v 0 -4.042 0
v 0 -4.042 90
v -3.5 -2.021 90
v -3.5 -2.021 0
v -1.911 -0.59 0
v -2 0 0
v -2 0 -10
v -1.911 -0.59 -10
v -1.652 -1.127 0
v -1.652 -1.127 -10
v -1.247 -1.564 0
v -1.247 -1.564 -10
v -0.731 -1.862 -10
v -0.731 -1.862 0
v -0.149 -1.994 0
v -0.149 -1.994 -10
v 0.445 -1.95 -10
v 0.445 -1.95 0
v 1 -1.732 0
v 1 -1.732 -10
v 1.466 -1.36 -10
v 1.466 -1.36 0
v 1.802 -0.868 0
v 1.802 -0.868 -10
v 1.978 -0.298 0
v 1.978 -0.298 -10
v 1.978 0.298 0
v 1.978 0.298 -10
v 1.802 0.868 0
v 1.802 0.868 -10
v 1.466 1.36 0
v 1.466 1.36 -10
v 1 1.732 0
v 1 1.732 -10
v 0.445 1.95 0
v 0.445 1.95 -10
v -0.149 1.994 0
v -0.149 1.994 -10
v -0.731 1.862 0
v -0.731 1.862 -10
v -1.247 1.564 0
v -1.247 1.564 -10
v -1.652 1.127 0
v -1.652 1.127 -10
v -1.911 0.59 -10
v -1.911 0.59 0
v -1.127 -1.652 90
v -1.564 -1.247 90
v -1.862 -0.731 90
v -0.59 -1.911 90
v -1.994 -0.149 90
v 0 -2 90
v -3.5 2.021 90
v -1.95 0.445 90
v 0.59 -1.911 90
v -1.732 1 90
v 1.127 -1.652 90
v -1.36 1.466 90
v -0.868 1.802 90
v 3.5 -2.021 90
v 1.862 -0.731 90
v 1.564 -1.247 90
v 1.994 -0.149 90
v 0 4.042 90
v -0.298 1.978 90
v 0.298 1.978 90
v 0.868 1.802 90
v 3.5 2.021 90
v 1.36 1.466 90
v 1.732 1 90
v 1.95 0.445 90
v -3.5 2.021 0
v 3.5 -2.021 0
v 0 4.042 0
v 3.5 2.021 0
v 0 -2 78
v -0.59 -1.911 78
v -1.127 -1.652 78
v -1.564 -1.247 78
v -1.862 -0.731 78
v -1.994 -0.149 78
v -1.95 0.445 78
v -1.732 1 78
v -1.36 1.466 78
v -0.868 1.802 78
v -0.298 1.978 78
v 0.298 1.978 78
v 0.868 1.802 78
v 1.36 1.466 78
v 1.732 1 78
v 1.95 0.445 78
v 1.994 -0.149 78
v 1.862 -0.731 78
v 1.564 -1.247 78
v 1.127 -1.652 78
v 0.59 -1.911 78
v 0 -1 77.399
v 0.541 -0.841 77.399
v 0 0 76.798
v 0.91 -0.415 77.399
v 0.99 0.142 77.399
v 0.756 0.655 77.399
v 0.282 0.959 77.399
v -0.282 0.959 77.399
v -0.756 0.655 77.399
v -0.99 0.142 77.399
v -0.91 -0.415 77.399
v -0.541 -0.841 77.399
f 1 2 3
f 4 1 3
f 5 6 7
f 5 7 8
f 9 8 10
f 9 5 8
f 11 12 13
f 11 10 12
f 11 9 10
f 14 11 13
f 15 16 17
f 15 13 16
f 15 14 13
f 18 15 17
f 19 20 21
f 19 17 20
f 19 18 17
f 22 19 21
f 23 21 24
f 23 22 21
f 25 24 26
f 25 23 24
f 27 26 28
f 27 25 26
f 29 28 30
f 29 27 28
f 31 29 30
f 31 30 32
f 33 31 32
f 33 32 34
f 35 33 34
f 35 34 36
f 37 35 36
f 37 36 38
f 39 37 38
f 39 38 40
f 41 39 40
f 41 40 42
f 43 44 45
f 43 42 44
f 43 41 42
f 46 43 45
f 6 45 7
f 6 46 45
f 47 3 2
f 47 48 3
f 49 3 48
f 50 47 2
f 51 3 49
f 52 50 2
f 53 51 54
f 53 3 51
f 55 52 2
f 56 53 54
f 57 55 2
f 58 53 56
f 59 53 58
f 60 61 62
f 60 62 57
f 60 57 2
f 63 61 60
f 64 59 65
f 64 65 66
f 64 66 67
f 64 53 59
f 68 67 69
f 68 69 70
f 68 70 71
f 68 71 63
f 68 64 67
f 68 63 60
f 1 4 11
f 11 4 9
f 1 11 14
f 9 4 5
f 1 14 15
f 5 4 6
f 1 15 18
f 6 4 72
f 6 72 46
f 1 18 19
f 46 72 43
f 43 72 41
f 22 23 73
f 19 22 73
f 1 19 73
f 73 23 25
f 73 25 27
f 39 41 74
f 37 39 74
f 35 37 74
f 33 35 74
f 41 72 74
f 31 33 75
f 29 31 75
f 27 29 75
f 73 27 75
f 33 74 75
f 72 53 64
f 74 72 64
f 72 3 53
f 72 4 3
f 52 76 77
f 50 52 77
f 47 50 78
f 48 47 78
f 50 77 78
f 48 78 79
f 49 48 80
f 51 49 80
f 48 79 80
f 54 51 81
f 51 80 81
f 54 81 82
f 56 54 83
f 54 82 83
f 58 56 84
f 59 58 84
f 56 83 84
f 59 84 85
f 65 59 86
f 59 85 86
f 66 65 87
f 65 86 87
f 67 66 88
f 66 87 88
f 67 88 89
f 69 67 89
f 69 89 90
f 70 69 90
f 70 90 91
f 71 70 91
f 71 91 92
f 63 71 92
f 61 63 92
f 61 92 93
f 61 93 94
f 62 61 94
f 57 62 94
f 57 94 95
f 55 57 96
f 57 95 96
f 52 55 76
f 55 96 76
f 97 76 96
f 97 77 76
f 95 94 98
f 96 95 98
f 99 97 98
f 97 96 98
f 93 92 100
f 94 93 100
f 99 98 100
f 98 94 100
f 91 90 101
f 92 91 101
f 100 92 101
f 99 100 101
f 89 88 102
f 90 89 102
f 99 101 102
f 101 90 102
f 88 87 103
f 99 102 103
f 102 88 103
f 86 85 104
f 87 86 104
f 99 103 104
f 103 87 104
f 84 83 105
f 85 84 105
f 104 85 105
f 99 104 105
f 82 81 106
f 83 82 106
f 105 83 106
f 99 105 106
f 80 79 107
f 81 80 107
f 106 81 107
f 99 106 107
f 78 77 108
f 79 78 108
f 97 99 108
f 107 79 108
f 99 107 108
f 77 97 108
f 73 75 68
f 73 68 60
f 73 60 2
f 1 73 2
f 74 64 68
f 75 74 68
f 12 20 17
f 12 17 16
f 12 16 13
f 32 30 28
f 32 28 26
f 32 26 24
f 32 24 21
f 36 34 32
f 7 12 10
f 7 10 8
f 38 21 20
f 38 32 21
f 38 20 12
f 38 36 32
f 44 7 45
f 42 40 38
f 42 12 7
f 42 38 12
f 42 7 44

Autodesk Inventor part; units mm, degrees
ref_plane "YZ Plane" through (0, 0, 0) normal (1, 0, 0) x (0, 1, 0)
ref_plane "XZ Plane" through (0, 0, 0) normal (0, 1, 0) x (-1, 0, 0)
ref_plane "XY Plane" through (0, 0, 0) normal (0, 0, 1) x (1, 0, 0)
sketch "スケッチ1" plane through (0, 0, 0) normal (0, 0, 1) x (1, 0, 0)
  circle A0 centre (0, 0) radius 3.5 construction
  line L0 (3.5, -2.0207) -> (0, -4.0415)
  line L1 (0, -4.0415) -> (-3.5, -2.0207)
  line L2 (-3.5, -2.0207) -> (-3.5, 2.0207)
  line L3 (-3.5, 2.0207) -> (0, 4.0415)
  line L4 (0, 4.0415) -> (3.5, 2.0207)
  line L5 (3.5, 2.0207) -> (3.5, -2.0207)
  point P0 (3.5, 0)
  dimension "d0" = 7
extrude "押し出し1" add sketch "スケッチ1" along normal blind 90
sketch "スケッチ2" plane through (0, 0, 90) normal (0, 0, 1) x (1, 0, 0)
  point P0 (0, 0)
  point P1 (0, 0)
hole "穴1" at (0, 0, 90) direction (0, 0, -1) diameter 4 depth 12 tip angle 118
sketch "スケッチ3" plane through (0, 0, 0) normal (0, 0, -1) x (-1, 0, 0)
  circle A0 centre (0, 0) radius 2
  dimension "d10" = 4
extrude "押し出し2" add sketch "スケッチ3" along normal blind 10
properties part number "六角スペーサー"
